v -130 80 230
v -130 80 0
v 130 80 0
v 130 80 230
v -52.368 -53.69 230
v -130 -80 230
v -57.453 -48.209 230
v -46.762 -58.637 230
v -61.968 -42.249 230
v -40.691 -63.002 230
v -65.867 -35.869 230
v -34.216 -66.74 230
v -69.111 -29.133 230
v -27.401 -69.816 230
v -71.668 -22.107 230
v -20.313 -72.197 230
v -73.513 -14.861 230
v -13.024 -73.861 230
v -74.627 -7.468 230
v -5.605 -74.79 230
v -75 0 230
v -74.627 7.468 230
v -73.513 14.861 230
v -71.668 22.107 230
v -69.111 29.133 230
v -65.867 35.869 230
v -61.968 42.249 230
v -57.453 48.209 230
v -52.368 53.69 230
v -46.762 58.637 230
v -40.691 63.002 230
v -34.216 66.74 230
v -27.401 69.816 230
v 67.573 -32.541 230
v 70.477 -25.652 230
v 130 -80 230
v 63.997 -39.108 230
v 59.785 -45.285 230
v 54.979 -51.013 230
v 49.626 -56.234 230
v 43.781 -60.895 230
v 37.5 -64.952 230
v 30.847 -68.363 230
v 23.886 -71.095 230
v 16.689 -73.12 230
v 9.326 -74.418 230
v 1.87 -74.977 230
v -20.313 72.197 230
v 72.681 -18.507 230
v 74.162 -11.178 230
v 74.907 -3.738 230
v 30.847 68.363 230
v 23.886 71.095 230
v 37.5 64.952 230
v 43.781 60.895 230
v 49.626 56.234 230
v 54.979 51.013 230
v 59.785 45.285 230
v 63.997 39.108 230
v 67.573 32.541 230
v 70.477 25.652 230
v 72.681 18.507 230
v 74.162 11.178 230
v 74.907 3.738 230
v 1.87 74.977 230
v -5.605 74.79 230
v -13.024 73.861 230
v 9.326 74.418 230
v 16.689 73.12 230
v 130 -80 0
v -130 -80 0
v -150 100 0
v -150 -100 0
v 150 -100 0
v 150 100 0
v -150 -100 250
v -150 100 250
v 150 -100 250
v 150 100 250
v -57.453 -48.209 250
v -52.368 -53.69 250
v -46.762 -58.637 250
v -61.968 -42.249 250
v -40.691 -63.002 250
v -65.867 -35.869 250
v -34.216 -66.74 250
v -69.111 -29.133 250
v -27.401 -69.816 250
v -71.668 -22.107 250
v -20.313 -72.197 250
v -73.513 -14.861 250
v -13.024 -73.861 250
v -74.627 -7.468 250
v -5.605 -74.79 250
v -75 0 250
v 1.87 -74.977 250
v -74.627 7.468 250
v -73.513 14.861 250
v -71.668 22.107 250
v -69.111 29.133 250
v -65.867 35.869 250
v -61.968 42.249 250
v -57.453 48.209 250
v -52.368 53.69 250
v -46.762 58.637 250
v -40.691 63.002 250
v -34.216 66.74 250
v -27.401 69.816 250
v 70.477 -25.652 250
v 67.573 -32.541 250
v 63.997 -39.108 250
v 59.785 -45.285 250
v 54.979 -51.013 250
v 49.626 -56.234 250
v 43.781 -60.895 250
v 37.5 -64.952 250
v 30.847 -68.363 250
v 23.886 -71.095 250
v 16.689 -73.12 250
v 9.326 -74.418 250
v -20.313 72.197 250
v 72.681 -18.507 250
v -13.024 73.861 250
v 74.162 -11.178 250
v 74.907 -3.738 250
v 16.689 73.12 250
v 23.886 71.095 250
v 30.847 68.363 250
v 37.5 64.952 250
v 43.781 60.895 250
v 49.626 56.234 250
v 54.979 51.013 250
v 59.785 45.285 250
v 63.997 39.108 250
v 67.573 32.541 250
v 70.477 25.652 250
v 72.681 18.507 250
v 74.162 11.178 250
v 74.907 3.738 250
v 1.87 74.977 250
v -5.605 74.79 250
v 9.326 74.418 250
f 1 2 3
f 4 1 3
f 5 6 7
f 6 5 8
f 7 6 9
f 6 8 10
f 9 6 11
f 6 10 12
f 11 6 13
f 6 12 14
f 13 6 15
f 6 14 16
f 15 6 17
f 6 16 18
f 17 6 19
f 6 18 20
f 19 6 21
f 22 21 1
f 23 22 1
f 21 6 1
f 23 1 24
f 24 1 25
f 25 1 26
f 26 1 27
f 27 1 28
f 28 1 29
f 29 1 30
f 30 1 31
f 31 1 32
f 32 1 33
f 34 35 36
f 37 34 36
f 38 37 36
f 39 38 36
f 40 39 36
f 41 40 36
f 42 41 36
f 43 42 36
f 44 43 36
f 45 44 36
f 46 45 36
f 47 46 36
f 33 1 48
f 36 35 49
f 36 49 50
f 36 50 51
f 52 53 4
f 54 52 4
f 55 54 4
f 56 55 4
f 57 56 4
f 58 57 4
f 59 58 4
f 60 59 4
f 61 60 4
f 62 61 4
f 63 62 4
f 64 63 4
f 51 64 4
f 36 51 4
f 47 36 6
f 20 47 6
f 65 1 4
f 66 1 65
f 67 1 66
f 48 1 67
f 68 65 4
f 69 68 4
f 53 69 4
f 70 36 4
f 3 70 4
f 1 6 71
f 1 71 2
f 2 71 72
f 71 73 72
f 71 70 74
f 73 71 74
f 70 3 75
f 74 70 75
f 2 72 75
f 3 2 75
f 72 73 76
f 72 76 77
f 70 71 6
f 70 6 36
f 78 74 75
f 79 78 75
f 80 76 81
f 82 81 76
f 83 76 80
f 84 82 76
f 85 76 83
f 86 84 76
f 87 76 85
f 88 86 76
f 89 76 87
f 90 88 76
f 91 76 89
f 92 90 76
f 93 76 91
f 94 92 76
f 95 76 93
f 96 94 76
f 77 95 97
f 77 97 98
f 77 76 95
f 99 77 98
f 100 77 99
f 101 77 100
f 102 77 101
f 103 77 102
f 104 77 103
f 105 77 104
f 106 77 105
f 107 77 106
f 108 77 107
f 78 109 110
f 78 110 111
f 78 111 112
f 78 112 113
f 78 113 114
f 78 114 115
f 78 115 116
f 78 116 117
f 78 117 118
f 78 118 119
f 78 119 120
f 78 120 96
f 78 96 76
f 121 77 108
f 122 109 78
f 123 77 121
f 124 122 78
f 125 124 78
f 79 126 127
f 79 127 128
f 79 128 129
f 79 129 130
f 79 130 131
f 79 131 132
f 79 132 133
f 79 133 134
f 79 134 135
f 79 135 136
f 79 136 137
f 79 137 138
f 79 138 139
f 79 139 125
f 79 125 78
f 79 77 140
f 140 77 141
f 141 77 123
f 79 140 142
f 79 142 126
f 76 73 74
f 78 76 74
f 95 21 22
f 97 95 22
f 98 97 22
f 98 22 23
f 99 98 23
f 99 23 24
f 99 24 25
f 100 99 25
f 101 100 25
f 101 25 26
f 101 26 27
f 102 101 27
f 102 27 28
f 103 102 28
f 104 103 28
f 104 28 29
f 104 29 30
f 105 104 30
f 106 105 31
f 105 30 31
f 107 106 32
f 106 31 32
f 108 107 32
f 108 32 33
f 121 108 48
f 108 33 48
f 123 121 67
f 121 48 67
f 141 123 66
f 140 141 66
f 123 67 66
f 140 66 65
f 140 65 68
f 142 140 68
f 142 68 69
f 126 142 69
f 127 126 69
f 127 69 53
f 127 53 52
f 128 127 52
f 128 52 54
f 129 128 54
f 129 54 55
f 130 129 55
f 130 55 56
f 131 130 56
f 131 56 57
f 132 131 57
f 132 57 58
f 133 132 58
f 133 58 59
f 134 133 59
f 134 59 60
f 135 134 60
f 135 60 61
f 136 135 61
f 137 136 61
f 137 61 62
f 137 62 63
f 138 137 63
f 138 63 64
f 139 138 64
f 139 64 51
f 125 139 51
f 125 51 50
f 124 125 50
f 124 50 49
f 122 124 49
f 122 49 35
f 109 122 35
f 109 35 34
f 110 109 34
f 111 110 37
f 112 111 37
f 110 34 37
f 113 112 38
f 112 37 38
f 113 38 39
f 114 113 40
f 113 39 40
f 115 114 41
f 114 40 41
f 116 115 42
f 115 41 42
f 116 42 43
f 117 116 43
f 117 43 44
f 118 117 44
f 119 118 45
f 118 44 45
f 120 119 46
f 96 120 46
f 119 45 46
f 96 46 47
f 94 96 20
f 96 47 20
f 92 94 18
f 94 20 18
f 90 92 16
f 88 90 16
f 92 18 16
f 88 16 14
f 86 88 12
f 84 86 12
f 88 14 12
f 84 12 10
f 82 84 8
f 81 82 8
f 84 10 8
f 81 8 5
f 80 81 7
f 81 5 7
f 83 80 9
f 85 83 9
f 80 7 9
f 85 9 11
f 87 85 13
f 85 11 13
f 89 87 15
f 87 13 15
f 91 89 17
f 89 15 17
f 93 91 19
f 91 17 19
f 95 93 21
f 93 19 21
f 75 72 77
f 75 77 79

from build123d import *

# Parameters (mm, degrees)
F0_W     = 300
F0_H     = 200
F1_DEPTH = 250
F3_T     = -20
F4_D     = 150


with BuildPart() as f1:
    # F0 (on Top) → F1 (new body)
    with BuildSketch(Plane.XY):
        Rectangle(F0_W, F0_H)
    extrude(amount=F1_DEPTH)

    # F3
    f3_openings = [f1.faces().sort_by_distance(p)[0] for p in [
        (0, 0, 0),
    ]]
    offset(amount=F3_T, openings=f3_openings)

    # F4 (through all)
    with Locations(Plane.XY.offset(250)):
        with Locations((0, 0)):
            Hole(F4_D / 2)


solid = f1.part
